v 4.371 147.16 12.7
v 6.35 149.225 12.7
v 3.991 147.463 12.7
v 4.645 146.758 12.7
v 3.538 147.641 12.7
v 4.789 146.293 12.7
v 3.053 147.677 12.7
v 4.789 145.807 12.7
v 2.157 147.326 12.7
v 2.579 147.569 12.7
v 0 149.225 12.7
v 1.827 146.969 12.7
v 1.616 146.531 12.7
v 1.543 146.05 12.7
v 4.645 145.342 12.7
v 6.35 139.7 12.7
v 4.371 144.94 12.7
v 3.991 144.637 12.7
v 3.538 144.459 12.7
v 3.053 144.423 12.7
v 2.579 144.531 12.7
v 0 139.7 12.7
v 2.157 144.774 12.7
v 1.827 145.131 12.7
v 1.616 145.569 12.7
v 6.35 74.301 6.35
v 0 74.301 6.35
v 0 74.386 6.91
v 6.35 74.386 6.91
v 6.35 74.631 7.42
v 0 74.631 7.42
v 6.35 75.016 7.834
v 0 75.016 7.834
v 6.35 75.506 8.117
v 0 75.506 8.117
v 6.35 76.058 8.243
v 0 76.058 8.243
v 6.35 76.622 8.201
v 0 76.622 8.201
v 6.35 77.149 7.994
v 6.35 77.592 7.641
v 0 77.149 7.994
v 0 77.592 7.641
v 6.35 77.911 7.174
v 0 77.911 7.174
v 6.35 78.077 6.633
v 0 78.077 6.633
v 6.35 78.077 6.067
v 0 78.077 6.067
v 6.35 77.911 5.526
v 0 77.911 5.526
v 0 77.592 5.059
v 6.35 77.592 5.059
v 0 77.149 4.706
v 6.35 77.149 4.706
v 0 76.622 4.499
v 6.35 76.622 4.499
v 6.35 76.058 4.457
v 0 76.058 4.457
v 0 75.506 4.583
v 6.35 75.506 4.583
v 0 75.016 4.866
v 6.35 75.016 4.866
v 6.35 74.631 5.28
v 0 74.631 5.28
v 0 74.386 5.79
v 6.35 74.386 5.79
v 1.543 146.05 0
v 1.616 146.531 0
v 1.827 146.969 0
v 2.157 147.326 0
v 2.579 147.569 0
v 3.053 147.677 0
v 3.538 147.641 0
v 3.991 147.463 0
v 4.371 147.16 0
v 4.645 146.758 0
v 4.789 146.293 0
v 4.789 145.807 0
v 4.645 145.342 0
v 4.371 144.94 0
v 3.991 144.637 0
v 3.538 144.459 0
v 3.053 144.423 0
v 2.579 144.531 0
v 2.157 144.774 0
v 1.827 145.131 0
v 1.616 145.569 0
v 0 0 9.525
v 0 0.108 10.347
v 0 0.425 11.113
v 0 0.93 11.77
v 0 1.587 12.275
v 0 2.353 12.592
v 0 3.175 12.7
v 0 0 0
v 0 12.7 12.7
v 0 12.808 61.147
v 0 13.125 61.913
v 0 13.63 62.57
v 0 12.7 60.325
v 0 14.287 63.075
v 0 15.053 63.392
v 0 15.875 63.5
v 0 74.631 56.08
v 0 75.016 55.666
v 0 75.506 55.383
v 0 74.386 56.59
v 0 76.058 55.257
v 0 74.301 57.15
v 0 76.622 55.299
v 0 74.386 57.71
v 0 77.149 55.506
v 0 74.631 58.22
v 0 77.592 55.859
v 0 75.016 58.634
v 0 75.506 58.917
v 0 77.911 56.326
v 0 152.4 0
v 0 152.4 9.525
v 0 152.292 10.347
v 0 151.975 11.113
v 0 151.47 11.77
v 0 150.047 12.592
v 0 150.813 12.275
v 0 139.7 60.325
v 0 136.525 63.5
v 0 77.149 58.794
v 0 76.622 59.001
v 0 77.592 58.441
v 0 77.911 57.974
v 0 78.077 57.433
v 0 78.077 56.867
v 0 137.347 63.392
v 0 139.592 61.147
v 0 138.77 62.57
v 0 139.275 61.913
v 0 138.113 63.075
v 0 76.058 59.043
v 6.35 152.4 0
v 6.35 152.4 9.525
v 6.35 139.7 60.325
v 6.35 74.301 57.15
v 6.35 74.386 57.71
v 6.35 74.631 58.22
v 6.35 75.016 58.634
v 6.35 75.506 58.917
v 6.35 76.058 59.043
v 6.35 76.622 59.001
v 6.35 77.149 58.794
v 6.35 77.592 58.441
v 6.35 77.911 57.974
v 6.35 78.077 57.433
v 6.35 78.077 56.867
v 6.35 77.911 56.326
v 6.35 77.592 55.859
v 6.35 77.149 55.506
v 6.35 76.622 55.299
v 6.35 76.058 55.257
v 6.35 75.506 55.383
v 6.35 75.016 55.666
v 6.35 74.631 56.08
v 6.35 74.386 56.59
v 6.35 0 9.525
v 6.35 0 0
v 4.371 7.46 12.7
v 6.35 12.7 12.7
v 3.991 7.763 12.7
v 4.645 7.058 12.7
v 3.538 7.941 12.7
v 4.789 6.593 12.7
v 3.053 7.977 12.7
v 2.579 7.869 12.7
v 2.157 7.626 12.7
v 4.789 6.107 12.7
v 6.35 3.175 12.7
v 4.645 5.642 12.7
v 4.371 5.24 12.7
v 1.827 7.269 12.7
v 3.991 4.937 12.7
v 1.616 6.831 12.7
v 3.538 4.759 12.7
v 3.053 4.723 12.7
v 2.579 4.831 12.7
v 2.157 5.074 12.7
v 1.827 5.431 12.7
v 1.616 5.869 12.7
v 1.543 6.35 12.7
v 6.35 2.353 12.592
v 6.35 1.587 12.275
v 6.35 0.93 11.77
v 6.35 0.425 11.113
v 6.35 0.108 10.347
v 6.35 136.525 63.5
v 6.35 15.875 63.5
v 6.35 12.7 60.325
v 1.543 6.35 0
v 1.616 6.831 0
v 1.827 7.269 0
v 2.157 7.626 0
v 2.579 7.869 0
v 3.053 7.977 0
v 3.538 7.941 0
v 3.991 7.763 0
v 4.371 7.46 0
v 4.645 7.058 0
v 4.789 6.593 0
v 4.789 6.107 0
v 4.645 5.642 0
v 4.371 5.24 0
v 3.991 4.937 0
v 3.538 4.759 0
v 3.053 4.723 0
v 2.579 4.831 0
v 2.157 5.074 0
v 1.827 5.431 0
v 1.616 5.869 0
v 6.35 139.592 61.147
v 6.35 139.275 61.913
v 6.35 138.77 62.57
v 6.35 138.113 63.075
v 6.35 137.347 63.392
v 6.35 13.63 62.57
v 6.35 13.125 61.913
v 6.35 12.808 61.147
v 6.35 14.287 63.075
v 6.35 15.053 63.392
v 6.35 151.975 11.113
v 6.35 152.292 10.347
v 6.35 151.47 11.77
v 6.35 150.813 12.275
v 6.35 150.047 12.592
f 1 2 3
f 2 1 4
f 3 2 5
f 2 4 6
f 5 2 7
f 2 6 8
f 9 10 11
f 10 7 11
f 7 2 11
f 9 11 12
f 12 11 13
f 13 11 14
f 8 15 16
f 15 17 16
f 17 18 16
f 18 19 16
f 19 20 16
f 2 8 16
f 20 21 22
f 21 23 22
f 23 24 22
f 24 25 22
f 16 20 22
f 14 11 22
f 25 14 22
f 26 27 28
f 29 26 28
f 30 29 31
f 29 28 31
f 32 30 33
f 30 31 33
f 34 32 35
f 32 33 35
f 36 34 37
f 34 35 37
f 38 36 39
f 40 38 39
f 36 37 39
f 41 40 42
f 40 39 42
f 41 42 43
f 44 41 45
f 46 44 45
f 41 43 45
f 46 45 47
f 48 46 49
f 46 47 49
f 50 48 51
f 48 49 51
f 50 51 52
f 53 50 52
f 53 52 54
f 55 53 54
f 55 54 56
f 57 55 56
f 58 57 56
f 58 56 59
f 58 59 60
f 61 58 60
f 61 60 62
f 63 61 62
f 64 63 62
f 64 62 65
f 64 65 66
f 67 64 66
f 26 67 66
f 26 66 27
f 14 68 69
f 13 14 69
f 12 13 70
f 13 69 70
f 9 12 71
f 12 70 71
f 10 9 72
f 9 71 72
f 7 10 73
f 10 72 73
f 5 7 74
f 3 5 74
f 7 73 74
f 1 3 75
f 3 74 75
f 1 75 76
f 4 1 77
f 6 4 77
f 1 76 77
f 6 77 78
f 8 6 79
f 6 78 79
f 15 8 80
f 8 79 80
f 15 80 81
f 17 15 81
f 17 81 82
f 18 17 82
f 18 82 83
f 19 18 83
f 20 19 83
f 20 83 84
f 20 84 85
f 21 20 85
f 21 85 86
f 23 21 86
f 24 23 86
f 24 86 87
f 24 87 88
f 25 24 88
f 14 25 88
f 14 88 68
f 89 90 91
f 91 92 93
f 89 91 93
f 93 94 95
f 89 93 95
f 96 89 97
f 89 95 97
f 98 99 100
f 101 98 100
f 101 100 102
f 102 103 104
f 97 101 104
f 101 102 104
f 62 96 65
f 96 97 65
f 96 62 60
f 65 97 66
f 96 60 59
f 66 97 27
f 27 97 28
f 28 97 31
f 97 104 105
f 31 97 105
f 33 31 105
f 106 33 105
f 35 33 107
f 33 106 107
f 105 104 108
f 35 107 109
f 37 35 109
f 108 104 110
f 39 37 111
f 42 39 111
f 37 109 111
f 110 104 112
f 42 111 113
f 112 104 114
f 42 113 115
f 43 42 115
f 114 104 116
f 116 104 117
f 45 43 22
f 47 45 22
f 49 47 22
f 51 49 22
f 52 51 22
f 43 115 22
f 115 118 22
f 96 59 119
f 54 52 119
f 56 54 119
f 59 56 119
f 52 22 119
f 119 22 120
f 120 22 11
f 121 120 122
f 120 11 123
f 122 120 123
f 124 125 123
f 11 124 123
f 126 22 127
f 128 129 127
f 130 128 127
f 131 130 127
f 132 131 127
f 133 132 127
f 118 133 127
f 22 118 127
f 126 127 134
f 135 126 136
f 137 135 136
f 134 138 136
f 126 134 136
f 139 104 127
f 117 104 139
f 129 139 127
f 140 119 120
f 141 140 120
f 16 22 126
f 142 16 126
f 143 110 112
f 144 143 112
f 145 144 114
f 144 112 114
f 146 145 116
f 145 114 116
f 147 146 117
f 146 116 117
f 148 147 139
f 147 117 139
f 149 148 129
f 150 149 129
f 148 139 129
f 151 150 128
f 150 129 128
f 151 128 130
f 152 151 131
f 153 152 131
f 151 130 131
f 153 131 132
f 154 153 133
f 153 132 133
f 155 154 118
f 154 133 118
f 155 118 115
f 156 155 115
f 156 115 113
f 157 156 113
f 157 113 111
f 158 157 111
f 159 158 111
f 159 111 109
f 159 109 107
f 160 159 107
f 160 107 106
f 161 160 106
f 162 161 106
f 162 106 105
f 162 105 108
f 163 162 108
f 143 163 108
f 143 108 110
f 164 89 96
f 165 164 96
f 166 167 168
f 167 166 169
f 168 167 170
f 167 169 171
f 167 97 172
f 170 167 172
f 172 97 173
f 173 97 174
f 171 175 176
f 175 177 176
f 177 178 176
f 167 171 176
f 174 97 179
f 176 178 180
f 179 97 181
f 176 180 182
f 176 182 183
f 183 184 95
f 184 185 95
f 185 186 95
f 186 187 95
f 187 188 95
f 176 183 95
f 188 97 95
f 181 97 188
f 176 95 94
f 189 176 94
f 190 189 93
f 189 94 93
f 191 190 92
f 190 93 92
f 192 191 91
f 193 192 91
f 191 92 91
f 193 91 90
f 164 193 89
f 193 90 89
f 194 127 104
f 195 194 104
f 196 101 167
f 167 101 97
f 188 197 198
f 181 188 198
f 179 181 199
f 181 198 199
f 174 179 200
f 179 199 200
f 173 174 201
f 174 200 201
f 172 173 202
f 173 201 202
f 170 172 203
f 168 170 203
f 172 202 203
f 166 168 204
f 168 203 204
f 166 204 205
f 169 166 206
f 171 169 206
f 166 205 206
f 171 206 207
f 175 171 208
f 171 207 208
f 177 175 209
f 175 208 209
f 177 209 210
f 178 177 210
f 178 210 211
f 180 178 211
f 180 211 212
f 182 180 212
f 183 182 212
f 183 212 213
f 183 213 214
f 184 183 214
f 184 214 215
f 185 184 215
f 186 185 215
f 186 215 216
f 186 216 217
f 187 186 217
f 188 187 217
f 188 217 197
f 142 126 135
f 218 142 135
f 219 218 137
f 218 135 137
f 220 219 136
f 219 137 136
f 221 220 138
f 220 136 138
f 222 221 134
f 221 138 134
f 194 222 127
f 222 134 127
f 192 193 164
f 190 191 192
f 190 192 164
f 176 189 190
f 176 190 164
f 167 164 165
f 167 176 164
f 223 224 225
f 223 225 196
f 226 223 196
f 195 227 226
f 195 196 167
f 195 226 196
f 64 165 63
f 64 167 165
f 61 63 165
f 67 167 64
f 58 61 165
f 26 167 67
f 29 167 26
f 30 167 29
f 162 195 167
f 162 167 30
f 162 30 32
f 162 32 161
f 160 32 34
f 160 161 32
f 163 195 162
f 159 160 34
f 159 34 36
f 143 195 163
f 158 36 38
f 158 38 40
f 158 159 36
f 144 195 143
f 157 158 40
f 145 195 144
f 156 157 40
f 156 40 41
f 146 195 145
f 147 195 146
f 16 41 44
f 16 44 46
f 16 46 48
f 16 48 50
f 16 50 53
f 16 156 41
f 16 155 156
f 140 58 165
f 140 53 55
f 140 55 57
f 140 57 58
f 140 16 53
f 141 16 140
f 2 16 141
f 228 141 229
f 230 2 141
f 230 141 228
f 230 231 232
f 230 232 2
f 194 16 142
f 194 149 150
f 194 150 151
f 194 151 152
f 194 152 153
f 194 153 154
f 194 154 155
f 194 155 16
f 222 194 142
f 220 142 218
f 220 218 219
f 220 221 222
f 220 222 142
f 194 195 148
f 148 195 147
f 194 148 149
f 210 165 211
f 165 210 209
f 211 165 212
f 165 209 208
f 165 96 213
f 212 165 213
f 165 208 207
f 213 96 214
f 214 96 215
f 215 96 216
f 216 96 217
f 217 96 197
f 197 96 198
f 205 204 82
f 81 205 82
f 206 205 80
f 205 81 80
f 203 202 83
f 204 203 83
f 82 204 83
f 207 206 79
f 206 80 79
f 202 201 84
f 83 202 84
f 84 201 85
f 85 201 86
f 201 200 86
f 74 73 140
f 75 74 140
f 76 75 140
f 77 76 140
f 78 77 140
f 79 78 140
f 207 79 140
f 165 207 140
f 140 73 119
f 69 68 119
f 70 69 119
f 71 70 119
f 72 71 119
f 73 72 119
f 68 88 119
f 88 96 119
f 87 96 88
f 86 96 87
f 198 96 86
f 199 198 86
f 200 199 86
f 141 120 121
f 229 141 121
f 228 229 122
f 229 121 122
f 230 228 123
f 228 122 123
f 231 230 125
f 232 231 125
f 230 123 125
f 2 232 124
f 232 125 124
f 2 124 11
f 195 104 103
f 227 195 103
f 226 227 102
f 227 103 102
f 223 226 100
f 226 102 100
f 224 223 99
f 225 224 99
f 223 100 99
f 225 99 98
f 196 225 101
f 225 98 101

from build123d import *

# Parameters (mm, degrees)
F1_DEPTH = 6.35
F3_D     = 3.7973
F5_D     = 3.2639


with BuildPart() as f1:
    # F0 (on Right) → F1 (new body)
    with BuildSketch(Plane.YZ):
        with BuildLine():
            Line((0, 9.525), (0, 0))
            Line((0, 0), (152.4, 0))
            Line((152.4, 0), (152.4, 9.525))
            ThreePointArc((152.4, 9.525), (151.4700640303, 11.7700640303), (149.225, 12.7))
            Line((149.225, 12.7), (139.7, 12.7))
            Line((139.7, 12.7), (139.7, 60.325))
            ThreePointArc((139.7, 60.325), (138.7700640303, 62.5700640303), (136.525, 63.5))
            Line((136.525, 63.5), (15.875, 63.5))
            ThreePointArc((15.875, 63.5), (13.6299359697, 62.5700640303), (12.7, 60.325))
            Line((12.7, 60.325), (12.7, 12.7))
            Line((12.7, 12.7), (3.175, 12.7))
            ThreePointArc((3.175, 12.7), (0.9299359697, 11.7700640303), (0, 9.525))
        make_face()
    extrude(amount=F1_DEPTH)

    # F3 (through all)
    with Locations(Plane.YZ.offset(6.35)):
        with Locations((76.2, 57.15), (76.2, 6.35)):
            Hole(F3_D / 2)

    # F5 (through all)
    with Locations(Plane.XY.offset(12.7)):
        with Locations((3.175, 6.35), (3.175, 146.05)):
            Hole(F5_D / 2)


solid = f1.part
